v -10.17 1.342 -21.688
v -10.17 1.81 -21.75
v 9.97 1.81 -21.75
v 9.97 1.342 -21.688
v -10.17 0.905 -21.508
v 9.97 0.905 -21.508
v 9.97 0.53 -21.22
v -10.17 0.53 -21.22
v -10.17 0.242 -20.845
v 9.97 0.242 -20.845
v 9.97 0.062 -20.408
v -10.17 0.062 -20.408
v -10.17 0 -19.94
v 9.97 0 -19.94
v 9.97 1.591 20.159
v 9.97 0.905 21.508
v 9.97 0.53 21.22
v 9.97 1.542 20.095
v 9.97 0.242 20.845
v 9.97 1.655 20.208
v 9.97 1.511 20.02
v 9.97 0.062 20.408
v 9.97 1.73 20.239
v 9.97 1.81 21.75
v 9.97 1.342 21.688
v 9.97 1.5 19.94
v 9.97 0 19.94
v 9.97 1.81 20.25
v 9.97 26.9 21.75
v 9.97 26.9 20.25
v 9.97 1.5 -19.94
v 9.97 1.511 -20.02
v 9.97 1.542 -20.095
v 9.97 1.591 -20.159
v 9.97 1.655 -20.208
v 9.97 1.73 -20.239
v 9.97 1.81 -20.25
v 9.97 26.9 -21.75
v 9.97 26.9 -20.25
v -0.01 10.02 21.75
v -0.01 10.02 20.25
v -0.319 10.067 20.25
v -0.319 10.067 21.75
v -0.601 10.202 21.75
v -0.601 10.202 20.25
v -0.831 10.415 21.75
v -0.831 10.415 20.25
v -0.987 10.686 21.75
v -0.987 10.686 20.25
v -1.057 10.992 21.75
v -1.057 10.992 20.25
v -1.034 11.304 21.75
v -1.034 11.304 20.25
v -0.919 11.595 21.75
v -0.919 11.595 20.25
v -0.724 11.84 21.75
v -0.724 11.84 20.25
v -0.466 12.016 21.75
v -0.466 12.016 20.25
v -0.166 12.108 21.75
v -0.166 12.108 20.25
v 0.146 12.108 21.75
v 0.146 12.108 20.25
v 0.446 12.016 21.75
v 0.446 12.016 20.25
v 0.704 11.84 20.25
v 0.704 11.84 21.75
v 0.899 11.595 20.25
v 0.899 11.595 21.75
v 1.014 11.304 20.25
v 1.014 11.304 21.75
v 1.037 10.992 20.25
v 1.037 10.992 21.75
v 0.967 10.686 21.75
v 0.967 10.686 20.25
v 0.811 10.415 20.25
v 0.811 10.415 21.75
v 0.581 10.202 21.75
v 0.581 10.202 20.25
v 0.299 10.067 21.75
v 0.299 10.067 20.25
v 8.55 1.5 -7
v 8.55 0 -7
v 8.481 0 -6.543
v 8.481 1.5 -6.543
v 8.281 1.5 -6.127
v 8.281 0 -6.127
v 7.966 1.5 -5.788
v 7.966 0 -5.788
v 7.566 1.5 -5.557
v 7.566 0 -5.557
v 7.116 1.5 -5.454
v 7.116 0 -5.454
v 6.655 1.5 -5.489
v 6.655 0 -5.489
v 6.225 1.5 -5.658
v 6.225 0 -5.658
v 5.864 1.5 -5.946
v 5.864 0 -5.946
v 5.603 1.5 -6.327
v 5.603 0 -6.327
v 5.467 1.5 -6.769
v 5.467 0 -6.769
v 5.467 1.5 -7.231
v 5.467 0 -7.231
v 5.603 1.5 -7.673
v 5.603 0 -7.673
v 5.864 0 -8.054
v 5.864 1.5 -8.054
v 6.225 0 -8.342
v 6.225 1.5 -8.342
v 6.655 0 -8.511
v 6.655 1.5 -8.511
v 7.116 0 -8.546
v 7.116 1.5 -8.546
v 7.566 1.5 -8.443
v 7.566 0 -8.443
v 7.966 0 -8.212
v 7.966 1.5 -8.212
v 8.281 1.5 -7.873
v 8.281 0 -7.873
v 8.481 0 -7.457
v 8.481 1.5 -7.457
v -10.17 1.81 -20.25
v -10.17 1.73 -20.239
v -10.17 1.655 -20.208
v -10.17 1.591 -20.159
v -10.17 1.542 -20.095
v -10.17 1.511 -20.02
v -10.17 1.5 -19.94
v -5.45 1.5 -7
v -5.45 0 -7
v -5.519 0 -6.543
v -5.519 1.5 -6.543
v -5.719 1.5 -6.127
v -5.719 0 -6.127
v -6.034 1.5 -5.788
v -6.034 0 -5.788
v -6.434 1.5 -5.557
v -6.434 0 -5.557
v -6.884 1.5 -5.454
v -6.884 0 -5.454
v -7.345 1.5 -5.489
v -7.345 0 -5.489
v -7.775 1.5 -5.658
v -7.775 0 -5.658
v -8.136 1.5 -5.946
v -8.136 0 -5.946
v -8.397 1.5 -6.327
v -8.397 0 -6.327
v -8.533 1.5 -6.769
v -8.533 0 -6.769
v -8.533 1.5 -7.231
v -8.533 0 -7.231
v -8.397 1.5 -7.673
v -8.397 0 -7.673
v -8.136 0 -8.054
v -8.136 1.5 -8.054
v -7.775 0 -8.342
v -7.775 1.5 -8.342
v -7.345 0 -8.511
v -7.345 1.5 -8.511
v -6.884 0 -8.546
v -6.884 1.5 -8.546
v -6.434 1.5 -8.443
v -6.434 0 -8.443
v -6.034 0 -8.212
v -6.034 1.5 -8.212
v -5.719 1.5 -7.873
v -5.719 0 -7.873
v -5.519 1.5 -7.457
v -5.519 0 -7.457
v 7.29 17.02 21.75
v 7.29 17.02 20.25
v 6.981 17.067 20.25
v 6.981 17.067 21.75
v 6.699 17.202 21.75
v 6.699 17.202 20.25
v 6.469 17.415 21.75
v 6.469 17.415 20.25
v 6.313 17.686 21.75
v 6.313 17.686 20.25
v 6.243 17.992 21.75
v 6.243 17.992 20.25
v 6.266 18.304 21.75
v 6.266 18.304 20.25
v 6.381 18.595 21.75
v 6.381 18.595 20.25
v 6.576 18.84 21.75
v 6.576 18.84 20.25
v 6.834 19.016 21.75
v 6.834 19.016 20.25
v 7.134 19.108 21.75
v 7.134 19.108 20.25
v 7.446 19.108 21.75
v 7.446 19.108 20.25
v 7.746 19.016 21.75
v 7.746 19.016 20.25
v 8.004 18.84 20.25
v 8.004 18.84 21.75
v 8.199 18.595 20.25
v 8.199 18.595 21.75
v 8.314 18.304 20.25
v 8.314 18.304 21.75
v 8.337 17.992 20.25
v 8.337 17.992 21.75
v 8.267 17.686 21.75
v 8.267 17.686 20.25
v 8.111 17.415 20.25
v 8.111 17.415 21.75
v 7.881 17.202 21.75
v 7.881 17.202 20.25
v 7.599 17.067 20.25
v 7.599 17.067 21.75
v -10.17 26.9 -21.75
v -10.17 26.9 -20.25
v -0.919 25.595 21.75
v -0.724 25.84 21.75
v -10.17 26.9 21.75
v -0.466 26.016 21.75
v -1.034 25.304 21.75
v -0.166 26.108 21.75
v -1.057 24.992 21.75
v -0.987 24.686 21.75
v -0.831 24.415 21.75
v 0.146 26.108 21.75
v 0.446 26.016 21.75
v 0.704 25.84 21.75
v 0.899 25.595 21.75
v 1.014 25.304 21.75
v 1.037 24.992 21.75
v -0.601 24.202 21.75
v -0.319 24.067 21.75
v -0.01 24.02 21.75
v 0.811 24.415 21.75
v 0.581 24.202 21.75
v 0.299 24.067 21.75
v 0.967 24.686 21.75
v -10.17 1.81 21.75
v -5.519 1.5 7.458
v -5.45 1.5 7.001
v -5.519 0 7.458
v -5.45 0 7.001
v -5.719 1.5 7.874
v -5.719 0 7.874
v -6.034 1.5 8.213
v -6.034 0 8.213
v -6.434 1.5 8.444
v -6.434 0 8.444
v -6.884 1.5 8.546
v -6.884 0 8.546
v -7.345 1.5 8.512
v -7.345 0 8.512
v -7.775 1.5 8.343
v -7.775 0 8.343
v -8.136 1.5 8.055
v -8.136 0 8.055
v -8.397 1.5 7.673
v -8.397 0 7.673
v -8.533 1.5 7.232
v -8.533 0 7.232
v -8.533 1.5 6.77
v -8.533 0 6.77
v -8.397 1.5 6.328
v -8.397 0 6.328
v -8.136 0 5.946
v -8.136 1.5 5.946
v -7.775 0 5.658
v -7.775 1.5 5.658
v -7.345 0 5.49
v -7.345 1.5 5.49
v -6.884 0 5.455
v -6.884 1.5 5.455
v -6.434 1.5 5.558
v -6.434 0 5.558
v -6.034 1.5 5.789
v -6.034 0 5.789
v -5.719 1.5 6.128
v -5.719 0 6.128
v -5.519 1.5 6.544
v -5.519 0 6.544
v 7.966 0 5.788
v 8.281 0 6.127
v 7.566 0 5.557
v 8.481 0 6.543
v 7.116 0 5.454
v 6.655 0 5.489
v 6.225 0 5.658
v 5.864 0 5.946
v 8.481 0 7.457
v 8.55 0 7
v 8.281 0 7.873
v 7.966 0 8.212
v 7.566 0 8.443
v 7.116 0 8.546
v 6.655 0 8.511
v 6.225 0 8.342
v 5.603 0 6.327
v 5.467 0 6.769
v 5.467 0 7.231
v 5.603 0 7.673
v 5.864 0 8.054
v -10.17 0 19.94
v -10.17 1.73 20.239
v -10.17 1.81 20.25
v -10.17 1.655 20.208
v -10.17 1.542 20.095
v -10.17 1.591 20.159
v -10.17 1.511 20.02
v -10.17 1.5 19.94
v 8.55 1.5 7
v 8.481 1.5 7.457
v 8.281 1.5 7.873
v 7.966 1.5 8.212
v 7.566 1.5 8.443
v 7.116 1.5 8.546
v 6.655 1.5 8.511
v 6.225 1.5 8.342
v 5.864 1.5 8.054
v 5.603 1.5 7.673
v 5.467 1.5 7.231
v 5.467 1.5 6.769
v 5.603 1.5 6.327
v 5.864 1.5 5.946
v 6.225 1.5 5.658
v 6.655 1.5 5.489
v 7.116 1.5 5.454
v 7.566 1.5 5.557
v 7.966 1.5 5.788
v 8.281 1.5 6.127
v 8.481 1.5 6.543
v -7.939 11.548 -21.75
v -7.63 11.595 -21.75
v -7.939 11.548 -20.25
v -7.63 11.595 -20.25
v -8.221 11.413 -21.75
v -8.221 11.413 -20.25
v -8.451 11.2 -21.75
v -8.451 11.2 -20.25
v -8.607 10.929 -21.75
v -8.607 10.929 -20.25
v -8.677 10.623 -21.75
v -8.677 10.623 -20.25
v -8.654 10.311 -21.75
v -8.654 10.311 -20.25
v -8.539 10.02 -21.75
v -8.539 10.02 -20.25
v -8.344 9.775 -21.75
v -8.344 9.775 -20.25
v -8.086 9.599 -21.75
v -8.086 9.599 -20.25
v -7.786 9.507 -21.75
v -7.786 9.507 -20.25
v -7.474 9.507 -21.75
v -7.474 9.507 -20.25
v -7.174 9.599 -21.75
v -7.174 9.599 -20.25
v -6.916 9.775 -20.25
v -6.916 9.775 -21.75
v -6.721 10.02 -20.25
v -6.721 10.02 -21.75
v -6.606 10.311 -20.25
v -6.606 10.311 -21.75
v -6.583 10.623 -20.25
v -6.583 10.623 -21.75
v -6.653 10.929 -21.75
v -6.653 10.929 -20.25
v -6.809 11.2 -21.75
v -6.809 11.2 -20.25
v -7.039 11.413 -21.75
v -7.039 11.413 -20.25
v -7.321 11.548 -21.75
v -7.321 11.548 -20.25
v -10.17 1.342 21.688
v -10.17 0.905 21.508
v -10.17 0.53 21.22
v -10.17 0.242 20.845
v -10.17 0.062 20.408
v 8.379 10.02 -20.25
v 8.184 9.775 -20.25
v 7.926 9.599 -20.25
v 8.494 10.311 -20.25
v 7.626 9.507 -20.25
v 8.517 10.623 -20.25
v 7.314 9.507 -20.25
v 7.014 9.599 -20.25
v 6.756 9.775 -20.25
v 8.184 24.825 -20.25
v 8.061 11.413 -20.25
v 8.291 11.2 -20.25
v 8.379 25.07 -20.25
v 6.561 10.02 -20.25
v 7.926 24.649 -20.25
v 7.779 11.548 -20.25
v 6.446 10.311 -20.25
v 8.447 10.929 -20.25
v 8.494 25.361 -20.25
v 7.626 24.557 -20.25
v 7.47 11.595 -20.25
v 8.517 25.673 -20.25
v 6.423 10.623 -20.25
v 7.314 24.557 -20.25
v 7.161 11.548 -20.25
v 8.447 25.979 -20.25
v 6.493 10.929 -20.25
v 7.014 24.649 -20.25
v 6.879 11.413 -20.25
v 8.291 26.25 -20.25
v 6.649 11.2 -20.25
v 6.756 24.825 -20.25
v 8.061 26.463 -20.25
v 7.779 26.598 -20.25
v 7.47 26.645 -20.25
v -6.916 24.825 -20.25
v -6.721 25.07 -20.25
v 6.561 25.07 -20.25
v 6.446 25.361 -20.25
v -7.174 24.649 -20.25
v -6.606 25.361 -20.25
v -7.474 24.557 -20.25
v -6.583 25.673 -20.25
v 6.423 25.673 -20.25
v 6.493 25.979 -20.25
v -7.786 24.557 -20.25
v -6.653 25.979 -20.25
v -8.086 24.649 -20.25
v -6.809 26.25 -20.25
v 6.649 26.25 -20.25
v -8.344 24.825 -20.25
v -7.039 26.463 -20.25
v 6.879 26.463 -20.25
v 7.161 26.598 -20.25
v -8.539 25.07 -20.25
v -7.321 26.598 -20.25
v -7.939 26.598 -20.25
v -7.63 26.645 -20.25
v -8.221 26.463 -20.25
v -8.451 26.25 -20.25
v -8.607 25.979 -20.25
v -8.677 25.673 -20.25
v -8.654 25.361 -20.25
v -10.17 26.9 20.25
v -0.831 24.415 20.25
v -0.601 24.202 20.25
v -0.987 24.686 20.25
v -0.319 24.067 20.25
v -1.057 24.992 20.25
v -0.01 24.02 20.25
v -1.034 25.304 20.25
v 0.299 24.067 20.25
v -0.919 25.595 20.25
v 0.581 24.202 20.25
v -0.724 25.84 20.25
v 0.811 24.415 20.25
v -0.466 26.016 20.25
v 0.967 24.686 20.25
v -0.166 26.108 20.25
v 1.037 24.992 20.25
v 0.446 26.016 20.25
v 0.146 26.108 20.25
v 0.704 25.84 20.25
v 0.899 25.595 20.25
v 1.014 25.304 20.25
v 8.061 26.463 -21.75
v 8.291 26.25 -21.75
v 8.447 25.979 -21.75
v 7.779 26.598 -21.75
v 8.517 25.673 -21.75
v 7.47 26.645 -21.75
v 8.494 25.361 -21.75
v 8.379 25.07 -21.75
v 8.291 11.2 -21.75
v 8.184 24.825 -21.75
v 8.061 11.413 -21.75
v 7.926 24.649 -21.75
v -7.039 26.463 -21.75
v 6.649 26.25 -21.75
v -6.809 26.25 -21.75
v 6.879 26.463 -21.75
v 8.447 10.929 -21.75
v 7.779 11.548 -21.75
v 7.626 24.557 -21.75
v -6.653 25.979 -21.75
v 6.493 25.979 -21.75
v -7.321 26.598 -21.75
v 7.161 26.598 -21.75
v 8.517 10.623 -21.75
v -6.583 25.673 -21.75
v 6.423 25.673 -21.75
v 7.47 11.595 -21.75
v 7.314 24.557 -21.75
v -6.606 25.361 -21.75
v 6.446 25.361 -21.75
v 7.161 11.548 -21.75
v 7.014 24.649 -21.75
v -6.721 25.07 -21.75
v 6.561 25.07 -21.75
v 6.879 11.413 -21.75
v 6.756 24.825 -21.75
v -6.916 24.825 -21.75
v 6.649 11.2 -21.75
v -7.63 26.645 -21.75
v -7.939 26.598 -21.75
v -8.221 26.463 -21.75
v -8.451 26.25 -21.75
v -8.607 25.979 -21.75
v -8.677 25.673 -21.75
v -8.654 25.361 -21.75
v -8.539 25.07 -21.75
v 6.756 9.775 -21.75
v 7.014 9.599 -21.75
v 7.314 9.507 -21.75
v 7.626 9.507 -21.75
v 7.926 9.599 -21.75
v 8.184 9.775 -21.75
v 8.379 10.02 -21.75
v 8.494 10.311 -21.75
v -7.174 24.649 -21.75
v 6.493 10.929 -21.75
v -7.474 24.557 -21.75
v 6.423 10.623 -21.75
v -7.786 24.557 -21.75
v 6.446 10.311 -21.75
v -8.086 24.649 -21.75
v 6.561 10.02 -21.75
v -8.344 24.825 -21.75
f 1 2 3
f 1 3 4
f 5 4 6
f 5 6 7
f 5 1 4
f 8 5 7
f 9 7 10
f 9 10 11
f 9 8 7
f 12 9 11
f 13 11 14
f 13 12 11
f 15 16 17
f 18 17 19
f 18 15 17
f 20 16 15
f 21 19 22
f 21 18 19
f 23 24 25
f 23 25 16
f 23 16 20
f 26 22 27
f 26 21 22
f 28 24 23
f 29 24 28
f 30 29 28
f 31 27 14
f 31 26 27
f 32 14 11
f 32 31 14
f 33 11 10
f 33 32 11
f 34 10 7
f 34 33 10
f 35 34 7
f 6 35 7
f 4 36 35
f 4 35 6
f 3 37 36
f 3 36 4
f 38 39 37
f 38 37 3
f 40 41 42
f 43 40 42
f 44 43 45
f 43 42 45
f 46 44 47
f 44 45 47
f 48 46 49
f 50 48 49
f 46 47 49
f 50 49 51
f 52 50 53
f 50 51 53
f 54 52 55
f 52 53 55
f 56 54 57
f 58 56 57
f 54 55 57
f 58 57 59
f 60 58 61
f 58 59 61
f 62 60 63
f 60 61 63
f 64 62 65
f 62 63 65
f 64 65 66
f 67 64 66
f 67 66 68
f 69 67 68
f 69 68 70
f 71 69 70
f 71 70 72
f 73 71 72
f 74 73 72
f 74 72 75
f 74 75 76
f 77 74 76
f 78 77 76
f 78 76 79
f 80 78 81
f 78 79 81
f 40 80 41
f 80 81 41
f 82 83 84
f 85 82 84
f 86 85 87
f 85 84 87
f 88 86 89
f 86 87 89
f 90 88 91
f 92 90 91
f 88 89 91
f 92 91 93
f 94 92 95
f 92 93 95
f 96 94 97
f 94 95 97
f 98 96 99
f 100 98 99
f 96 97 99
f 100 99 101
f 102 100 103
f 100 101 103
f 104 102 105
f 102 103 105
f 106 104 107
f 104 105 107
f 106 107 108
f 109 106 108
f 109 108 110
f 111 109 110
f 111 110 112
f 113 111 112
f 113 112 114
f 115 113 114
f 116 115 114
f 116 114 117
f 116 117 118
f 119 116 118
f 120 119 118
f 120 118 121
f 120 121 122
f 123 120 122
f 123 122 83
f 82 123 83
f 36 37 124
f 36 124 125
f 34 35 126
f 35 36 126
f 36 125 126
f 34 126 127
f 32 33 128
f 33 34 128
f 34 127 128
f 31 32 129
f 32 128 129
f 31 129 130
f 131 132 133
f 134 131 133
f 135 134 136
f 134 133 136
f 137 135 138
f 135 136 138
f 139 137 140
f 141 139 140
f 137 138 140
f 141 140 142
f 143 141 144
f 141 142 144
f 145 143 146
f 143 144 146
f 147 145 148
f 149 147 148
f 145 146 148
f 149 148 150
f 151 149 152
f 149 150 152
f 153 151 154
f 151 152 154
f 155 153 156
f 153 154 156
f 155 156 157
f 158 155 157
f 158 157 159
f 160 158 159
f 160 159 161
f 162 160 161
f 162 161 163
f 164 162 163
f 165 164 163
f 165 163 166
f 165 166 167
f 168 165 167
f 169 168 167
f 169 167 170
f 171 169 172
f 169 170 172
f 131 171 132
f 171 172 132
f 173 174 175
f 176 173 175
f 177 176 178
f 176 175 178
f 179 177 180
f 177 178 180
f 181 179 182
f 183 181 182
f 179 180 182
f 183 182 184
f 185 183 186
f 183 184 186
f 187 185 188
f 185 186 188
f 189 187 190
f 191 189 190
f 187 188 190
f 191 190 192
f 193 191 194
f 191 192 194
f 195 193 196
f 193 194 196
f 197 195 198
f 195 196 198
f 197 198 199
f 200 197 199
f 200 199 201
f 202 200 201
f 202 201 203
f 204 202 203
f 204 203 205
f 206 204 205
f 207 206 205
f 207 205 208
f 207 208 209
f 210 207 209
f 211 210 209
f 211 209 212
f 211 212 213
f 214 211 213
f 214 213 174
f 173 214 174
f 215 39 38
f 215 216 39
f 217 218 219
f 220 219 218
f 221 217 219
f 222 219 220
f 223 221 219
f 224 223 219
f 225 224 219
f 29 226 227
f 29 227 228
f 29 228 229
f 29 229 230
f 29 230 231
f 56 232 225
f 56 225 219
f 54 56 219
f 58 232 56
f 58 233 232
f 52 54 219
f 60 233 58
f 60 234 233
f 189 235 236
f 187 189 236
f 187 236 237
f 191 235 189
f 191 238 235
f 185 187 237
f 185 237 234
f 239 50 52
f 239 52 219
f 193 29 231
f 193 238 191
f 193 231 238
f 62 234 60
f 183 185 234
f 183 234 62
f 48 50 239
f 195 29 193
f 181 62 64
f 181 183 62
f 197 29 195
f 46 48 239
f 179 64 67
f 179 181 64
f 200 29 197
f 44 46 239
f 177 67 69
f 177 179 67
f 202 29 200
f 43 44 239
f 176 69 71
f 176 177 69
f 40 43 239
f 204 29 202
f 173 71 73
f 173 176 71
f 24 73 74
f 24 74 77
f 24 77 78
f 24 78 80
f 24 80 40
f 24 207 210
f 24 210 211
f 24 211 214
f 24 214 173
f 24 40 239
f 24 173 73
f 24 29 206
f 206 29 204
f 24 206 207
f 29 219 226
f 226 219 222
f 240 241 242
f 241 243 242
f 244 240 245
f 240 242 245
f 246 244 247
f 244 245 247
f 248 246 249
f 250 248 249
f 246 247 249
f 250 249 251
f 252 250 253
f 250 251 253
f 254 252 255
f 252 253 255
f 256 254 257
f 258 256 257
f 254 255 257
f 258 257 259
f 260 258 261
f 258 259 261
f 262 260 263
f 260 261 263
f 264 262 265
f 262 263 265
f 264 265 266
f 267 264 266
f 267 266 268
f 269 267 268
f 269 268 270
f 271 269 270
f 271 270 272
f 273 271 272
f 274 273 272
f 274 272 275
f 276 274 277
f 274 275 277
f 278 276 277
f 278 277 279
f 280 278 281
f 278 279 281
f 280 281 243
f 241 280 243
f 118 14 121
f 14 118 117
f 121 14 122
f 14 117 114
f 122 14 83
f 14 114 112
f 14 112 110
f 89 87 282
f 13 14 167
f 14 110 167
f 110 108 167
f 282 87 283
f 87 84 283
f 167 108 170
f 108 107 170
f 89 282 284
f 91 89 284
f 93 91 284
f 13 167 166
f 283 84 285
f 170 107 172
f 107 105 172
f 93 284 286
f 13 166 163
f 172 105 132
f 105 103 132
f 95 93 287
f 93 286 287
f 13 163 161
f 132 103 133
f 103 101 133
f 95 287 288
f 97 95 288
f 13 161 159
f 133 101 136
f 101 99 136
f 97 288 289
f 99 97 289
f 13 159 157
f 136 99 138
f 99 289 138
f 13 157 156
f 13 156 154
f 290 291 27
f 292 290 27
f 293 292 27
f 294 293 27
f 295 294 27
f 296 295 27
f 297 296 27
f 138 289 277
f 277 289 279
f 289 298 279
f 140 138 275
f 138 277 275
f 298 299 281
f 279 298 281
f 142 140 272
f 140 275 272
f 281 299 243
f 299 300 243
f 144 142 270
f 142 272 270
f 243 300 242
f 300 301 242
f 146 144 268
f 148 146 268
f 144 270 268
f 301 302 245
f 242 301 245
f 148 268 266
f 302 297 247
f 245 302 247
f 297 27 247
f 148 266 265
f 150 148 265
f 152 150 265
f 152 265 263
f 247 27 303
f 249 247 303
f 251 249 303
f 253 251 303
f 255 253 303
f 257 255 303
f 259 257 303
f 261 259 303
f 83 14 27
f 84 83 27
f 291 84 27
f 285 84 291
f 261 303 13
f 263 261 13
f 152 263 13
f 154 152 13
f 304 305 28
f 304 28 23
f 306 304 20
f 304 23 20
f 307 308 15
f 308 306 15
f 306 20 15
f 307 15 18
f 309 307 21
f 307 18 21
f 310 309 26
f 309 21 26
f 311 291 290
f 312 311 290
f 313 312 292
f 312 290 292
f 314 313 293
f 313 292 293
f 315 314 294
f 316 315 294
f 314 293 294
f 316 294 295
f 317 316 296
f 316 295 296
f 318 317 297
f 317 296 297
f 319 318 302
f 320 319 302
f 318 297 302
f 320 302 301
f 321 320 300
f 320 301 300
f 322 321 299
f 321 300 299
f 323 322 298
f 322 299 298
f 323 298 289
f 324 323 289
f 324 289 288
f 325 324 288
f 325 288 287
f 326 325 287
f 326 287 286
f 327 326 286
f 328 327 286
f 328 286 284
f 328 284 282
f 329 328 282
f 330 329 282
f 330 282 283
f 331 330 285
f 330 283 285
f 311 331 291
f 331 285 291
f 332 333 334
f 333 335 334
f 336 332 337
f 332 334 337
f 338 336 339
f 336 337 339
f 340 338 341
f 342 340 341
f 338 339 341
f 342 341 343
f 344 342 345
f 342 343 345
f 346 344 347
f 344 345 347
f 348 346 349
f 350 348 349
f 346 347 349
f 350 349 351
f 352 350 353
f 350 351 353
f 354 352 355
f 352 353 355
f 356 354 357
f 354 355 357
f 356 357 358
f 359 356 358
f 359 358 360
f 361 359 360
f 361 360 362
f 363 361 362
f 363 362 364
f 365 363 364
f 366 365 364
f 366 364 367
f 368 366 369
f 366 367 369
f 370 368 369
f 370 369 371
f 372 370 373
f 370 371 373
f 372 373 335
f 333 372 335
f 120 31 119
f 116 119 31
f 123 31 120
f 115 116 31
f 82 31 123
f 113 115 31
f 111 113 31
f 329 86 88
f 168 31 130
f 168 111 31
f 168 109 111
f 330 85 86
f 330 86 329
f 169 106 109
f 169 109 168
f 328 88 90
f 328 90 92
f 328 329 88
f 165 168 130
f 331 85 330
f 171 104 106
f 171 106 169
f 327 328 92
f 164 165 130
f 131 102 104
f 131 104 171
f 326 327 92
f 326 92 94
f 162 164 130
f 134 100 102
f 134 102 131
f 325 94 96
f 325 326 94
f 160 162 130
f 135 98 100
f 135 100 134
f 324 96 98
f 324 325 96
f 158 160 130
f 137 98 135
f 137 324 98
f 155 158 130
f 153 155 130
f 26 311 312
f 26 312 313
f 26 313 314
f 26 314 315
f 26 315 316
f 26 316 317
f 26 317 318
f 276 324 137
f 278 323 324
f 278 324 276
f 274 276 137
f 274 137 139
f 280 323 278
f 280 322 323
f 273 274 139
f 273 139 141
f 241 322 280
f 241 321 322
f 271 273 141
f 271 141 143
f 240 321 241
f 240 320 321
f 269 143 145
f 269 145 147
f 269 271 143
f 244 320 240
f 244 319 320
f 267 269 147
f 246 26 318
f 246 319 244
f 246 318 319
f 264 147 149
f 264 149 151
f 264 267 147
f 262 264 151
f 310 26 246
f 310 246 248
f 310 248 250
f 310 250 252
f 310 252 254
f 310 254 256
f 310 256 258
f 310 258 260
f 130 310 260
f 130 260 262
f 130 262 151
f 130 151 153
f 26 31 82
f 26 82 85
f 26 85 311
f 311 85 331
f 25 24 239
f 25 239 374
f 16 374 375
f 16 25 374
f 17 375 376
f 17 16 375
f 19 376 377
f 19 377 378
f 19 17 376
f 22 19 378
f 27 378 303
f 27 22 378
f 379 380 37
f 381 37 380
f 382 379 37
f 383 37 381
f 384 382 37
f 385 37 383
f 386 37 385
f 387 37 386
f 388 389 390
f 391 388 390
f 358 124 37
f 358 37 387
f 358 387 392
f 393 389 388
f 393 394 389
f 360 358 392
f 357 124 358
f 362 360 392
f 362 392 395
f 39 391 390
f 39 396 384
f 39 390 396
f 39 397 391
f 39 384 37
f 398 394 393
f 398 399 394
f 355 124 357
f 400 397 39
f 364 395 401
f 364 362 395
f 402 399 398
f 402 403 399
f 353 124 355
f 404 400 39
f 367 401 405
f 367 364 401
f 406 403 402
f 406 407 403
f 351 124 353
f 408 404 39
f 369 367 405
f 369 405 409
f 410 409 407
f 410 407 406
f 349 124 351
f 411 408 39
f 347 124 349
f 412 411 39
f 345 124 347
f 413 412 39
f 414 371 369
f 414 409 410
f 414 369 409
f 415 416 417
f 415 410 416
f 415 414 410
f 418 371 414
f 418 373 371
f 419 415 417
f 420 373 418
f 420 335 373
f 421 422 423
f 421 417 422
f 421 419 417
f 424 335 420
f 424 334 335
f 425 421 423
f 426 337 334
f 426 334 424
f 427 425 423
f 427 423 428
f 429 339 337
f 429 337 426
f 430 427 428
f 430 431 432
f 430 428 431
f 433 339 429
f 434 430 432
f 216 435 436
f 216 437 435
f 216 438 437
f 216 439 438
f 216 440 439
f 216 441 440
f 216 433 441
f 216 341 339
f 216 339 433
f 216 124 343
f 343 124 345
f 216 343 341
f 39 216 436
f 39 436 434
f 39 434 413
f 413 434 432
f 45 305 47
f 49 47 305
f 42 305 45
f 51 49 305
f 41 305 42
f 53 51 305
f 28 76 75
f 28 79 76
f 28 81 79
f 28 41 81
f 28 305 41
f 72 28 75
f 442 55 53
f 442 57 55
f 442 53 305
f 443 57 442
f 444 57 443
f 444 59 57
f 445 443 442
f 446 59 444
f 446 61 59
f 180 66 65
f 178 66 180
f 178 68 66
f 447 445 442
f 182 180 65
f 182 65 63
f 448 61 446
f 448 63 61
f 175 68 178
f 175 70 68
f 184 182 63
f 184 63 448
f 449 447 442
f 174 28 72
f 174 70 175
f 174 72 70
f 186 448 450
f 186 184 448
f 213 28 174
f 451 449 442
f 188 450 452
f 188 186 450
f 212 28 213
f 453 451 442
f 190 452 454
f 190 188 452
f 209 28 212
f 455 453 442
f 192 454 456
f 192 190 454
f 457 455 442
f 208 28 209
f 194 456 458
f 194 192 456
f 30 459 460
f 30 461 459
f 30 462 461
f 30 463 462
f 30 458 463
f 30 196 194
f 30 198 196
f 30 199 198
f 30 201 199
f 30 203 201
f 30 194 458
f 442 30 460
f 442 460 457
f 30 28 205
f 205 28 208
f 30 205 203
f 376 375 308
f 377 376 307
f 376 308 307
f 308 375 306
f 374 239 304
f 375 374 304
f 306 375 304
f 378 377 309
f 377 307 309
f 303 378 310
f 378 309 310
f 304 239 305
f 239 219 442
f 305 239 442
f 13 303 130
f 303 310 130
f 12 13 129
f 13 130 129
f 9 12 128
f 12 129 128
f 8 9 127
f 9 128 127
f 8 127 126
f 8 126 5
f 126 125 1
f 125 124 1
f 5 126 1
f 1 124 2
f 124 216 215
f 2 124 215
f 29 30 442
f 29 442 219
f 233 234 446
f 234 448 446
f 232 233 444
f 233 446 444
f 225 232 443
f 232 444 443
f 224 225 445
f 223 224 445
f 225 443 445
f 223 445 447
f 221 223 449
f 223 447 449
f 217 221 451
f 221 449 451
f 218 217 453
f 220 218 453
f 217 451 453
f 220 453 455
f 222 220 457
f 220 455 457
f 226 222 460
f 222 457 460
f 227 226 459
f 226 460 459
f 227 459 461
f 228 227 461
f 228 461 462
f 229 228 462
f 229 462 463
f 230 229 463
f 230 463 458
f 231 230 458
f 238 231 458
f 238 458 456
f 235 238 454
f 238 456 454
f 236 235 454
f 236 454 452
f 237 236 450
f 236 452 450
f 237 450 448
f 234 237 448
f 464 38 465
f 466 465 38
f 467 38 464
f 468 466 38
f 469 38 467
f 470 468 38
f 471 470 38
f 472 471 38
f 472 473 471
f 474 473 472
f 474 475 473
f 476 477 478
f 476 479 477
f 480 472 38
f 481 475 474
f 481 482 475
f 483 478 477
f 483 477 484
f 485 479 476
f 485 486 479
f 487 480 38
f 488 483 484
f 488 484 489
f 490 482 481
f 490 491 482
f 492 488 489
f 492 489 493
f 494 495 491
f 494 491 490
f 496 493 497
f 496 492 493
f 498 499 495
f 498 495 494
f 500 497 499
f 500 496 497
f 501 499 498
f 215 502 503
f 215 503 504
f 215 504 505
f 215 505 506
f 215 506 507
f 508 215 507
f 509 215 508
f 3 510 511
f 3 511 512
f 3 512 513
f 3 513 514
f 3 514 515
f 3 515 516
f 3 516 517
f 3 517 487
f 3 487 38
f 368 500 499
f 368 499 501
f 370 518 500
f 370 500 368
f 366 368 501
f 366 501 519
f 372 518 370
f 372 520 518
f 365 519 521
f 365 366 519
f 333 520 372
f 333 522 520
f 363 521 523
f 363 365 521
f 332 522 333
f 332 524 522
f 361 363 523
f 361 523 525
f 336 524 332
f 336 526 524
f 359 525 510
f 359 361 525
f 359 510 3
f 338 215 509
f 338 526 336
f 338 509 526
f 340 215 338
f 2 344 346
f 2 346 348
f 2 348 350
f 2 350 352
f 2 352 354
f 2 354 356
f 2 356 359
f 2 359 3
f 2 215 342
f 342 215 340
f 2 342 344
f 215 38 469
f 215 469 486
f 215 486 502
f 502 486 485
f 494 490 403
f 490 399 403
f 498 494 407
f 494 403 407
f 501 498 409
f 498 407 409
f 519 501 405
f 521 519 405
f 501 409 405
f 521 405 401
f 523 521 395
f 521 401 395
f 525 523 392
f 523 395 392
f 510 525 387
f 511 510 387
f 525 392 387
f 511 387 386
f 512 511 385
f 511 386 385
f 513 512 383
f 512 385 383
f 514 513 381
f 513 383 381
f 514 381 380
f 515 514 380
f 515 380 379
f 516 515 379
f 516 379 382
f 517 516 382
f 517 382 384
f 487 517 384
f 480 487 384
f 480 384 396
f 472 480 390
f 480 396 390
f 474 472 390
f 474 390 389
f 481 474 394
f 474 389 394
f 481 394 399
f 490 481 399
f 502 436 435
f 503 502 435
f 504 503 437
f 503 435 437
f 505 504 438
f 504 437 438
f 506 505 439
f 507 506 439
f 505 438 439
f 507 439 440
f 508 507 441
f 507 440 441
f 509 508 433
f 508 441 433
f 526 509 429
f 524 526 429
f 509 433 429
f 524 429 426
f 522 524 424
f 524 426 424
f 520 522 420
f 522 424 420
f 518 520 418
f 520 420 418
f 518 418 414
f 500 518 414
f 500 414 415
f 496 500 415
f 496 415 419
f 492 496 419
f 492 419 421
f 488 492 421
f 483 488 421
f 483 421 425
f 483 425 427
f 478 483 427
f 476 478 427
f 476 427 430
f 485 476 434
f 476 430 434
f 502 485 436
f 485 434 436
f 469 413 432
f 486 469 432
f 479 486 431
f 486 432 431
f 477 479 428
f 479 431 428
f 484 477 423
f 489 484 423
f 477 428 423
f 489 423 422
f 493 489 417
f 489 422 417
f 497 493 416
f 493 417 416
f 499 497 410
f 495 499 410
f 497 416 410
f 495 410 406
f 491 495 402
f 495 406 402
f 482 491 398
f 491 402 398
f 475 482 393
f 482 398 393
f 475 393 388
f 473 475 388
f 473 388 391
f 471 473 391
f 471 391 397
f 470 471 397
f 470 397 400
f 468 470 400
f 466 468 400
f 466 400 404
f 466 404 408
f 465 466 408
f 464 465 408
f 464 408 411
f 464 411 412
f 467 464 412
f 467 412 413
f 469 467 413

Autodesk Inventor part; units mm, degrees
ref_plane "YZ Plane" through (0, 0, 0) normal (1, 0, 0) x (0, 1, 0)
ref_plane "XZ Plane" through (0, 0, 0) normal (0, 1, 0) x (-1, 0, 0)
ref_plane "XY Plane" through (0, 0, 0) normal (0, 0, 1) x (1, 0, 0)
sketch "Sketch1" plane through (0, 0, 0) normal (0, 1, 0) x (-1, 0, 0)
  line L0 (10.17, 20.25) -> (-9.97, 20.25)
  line L1 (-9.97, 20.25) -> (-9.97, -20.25)
  line L2 (-9.97, -20.25) -> (10.17, -20.25)
  line L3 (10.17, -20.25) -> (10.17, 20.25)
  point P0 (0, 0)
  dimension "d0" = 40.5
  dimension "d1" = 20.14
  dimension "d2" = 10.17
  dimension "d3" = 20.25
extrude "Plate1" add sketch "Sketch1" along normal blind 1.5
sketch "Sketch2" plane through (9.97, 0, 21.75) normal (0, 0, -1) x (-1, 0, 0)
  line L0 (20.14, 0) -> (0, 0)
  line L1 (0, 0) -> (0, 26.9)
  line L2 (0, 26.9) -> (20.14, 26.9)
  line L3 (20.14, 26.9) -> (20.14, 0)
edge flange "Flange1" height 26.9 angle 90 thickness 1.5 bend radius 0.31 thickness toward (0, 0, -1) relief tear relief width 1.5 relief depth 0.75 corner gap 0.31 corner form 0 edges at (-0.1, 1.5, 20.25) (-0.1, 1.5, -20.25) wall of the first edge with corners at (-10.17, 0, 21.75) (9.97, 0, 21.75) (9.97, 26.9, 21.75) (-10.17, 26.9, 21.75)
bend "Bend1"
corner "Corner1"
sketch "Sketch3" plane through (-10.17, 26.9, 21.75) normal (0, 0, 1) x (1, 0, 0)
  circle A0 centre (10.16, -1.83) radius 0.7835 projected
  circle A1 centre (10.16, -15.83) radius 0.7835 projected
  circle A2 centre (17.46, -8.83) radius 0.7835 projected
  point P0 (10.17, -26.9)
hole "Hole1" at (-0.01, 25.07, 21.75) at (7.29, 18.07, 21.75) at (-0.01, 11.07, 21.75) direction (0, 0, -1) diameter 2.1 depth 1.5
sketch "Sketch4" plane through (9.97, 26.9, -21.75) normal (0, 0, -1) x (-1, 0, 0)
  circle A0 centre (2.5, -16.355) radius 0.7835 projected
  circle A1 centre (17.6, -16.355) radius 0.7835 projected
  circle A2 centre (17.6, -1.305) radius 0.7835 projected
  circle A3 centre (2.5, -1.305) radius 0.7835 projected
  point P0 (9.97, -26.9)
hole "Hole2" at (-7.63, 25.595, -21.75) at (-7.63, 10.545, -21.75) at (7.47, 10.545, -21.75) at (7.47, 25.595, -21.75) direction (0, 0, 1) diameter 2.1 depth 1.5
sketch "Sketch5" plane through (0, 0, 0) normal (0, -1, 0) x (1, 0, 0)
  circle A0 centre (-7, 7.0007) radius 1.55
  circle A1 centre (7, 7) radius 1.55
  circle A2 centre (7, -7) radius 1.55
  circle A3 centre (-7, -7) radius 1.55
  point P0 (0, 0)
  dimension "d29" = 3.1
  dimension "d30" = 7
  dimension "d31" = 9.9
  dimension "d32" = 3.1
  dimension "d33" = 7
  dimension "d34" = 7
  dimension "d35" = 3.1
  dimension "d36" = 7
  dimension "d37" = 7
  dimension "d38" = 3.1
  dimension "d39" = 7
  dimension "d40" = 7
extrude "Cut1" cut sketch "Sketch5" against normal blind 1.5
equation "\"d20\" = Thickness"
equation "\"d27\" = Thickness"
equation "\"d41\" = Thickness"
equation "\"d4\" = Thickness"
equation "\"d5\" = BendReliefWidth"
equation "\"d6\" = BendReliefDepth"
equation "\"d7\" = MinimumRemnant"
equation "\"d8\" = TransitionRadius"
equation "\"d11\" = BendRadius"
equation "\"d12\" = CornerReliefSize"
equation "\"d13\" = GapSize"
equation "\"d14\" = JacobiRadiusSize"
equation "\"BendReliefWidth\" = Thickness"
equation "\"BendReliefDepth\" = 0.5 * Thickness"
equation "\"CornerReliefSize\" = 4 * Thickness"
equation "\"MinimumRemnant\" = 2 * Thickness"
equation "\"TransitionRadius\" = BendRadius"
equation "\"JacobiRadiusSize\" = BendRadius"
equation "\"GapSize\" = Thickness"
equation "\"Thickness\" = 1.5"
equation "\"BendRadius\" = 0.31"
properties part number "axis_25_bottom_frame" material "Aluminum 6061-AHC"
